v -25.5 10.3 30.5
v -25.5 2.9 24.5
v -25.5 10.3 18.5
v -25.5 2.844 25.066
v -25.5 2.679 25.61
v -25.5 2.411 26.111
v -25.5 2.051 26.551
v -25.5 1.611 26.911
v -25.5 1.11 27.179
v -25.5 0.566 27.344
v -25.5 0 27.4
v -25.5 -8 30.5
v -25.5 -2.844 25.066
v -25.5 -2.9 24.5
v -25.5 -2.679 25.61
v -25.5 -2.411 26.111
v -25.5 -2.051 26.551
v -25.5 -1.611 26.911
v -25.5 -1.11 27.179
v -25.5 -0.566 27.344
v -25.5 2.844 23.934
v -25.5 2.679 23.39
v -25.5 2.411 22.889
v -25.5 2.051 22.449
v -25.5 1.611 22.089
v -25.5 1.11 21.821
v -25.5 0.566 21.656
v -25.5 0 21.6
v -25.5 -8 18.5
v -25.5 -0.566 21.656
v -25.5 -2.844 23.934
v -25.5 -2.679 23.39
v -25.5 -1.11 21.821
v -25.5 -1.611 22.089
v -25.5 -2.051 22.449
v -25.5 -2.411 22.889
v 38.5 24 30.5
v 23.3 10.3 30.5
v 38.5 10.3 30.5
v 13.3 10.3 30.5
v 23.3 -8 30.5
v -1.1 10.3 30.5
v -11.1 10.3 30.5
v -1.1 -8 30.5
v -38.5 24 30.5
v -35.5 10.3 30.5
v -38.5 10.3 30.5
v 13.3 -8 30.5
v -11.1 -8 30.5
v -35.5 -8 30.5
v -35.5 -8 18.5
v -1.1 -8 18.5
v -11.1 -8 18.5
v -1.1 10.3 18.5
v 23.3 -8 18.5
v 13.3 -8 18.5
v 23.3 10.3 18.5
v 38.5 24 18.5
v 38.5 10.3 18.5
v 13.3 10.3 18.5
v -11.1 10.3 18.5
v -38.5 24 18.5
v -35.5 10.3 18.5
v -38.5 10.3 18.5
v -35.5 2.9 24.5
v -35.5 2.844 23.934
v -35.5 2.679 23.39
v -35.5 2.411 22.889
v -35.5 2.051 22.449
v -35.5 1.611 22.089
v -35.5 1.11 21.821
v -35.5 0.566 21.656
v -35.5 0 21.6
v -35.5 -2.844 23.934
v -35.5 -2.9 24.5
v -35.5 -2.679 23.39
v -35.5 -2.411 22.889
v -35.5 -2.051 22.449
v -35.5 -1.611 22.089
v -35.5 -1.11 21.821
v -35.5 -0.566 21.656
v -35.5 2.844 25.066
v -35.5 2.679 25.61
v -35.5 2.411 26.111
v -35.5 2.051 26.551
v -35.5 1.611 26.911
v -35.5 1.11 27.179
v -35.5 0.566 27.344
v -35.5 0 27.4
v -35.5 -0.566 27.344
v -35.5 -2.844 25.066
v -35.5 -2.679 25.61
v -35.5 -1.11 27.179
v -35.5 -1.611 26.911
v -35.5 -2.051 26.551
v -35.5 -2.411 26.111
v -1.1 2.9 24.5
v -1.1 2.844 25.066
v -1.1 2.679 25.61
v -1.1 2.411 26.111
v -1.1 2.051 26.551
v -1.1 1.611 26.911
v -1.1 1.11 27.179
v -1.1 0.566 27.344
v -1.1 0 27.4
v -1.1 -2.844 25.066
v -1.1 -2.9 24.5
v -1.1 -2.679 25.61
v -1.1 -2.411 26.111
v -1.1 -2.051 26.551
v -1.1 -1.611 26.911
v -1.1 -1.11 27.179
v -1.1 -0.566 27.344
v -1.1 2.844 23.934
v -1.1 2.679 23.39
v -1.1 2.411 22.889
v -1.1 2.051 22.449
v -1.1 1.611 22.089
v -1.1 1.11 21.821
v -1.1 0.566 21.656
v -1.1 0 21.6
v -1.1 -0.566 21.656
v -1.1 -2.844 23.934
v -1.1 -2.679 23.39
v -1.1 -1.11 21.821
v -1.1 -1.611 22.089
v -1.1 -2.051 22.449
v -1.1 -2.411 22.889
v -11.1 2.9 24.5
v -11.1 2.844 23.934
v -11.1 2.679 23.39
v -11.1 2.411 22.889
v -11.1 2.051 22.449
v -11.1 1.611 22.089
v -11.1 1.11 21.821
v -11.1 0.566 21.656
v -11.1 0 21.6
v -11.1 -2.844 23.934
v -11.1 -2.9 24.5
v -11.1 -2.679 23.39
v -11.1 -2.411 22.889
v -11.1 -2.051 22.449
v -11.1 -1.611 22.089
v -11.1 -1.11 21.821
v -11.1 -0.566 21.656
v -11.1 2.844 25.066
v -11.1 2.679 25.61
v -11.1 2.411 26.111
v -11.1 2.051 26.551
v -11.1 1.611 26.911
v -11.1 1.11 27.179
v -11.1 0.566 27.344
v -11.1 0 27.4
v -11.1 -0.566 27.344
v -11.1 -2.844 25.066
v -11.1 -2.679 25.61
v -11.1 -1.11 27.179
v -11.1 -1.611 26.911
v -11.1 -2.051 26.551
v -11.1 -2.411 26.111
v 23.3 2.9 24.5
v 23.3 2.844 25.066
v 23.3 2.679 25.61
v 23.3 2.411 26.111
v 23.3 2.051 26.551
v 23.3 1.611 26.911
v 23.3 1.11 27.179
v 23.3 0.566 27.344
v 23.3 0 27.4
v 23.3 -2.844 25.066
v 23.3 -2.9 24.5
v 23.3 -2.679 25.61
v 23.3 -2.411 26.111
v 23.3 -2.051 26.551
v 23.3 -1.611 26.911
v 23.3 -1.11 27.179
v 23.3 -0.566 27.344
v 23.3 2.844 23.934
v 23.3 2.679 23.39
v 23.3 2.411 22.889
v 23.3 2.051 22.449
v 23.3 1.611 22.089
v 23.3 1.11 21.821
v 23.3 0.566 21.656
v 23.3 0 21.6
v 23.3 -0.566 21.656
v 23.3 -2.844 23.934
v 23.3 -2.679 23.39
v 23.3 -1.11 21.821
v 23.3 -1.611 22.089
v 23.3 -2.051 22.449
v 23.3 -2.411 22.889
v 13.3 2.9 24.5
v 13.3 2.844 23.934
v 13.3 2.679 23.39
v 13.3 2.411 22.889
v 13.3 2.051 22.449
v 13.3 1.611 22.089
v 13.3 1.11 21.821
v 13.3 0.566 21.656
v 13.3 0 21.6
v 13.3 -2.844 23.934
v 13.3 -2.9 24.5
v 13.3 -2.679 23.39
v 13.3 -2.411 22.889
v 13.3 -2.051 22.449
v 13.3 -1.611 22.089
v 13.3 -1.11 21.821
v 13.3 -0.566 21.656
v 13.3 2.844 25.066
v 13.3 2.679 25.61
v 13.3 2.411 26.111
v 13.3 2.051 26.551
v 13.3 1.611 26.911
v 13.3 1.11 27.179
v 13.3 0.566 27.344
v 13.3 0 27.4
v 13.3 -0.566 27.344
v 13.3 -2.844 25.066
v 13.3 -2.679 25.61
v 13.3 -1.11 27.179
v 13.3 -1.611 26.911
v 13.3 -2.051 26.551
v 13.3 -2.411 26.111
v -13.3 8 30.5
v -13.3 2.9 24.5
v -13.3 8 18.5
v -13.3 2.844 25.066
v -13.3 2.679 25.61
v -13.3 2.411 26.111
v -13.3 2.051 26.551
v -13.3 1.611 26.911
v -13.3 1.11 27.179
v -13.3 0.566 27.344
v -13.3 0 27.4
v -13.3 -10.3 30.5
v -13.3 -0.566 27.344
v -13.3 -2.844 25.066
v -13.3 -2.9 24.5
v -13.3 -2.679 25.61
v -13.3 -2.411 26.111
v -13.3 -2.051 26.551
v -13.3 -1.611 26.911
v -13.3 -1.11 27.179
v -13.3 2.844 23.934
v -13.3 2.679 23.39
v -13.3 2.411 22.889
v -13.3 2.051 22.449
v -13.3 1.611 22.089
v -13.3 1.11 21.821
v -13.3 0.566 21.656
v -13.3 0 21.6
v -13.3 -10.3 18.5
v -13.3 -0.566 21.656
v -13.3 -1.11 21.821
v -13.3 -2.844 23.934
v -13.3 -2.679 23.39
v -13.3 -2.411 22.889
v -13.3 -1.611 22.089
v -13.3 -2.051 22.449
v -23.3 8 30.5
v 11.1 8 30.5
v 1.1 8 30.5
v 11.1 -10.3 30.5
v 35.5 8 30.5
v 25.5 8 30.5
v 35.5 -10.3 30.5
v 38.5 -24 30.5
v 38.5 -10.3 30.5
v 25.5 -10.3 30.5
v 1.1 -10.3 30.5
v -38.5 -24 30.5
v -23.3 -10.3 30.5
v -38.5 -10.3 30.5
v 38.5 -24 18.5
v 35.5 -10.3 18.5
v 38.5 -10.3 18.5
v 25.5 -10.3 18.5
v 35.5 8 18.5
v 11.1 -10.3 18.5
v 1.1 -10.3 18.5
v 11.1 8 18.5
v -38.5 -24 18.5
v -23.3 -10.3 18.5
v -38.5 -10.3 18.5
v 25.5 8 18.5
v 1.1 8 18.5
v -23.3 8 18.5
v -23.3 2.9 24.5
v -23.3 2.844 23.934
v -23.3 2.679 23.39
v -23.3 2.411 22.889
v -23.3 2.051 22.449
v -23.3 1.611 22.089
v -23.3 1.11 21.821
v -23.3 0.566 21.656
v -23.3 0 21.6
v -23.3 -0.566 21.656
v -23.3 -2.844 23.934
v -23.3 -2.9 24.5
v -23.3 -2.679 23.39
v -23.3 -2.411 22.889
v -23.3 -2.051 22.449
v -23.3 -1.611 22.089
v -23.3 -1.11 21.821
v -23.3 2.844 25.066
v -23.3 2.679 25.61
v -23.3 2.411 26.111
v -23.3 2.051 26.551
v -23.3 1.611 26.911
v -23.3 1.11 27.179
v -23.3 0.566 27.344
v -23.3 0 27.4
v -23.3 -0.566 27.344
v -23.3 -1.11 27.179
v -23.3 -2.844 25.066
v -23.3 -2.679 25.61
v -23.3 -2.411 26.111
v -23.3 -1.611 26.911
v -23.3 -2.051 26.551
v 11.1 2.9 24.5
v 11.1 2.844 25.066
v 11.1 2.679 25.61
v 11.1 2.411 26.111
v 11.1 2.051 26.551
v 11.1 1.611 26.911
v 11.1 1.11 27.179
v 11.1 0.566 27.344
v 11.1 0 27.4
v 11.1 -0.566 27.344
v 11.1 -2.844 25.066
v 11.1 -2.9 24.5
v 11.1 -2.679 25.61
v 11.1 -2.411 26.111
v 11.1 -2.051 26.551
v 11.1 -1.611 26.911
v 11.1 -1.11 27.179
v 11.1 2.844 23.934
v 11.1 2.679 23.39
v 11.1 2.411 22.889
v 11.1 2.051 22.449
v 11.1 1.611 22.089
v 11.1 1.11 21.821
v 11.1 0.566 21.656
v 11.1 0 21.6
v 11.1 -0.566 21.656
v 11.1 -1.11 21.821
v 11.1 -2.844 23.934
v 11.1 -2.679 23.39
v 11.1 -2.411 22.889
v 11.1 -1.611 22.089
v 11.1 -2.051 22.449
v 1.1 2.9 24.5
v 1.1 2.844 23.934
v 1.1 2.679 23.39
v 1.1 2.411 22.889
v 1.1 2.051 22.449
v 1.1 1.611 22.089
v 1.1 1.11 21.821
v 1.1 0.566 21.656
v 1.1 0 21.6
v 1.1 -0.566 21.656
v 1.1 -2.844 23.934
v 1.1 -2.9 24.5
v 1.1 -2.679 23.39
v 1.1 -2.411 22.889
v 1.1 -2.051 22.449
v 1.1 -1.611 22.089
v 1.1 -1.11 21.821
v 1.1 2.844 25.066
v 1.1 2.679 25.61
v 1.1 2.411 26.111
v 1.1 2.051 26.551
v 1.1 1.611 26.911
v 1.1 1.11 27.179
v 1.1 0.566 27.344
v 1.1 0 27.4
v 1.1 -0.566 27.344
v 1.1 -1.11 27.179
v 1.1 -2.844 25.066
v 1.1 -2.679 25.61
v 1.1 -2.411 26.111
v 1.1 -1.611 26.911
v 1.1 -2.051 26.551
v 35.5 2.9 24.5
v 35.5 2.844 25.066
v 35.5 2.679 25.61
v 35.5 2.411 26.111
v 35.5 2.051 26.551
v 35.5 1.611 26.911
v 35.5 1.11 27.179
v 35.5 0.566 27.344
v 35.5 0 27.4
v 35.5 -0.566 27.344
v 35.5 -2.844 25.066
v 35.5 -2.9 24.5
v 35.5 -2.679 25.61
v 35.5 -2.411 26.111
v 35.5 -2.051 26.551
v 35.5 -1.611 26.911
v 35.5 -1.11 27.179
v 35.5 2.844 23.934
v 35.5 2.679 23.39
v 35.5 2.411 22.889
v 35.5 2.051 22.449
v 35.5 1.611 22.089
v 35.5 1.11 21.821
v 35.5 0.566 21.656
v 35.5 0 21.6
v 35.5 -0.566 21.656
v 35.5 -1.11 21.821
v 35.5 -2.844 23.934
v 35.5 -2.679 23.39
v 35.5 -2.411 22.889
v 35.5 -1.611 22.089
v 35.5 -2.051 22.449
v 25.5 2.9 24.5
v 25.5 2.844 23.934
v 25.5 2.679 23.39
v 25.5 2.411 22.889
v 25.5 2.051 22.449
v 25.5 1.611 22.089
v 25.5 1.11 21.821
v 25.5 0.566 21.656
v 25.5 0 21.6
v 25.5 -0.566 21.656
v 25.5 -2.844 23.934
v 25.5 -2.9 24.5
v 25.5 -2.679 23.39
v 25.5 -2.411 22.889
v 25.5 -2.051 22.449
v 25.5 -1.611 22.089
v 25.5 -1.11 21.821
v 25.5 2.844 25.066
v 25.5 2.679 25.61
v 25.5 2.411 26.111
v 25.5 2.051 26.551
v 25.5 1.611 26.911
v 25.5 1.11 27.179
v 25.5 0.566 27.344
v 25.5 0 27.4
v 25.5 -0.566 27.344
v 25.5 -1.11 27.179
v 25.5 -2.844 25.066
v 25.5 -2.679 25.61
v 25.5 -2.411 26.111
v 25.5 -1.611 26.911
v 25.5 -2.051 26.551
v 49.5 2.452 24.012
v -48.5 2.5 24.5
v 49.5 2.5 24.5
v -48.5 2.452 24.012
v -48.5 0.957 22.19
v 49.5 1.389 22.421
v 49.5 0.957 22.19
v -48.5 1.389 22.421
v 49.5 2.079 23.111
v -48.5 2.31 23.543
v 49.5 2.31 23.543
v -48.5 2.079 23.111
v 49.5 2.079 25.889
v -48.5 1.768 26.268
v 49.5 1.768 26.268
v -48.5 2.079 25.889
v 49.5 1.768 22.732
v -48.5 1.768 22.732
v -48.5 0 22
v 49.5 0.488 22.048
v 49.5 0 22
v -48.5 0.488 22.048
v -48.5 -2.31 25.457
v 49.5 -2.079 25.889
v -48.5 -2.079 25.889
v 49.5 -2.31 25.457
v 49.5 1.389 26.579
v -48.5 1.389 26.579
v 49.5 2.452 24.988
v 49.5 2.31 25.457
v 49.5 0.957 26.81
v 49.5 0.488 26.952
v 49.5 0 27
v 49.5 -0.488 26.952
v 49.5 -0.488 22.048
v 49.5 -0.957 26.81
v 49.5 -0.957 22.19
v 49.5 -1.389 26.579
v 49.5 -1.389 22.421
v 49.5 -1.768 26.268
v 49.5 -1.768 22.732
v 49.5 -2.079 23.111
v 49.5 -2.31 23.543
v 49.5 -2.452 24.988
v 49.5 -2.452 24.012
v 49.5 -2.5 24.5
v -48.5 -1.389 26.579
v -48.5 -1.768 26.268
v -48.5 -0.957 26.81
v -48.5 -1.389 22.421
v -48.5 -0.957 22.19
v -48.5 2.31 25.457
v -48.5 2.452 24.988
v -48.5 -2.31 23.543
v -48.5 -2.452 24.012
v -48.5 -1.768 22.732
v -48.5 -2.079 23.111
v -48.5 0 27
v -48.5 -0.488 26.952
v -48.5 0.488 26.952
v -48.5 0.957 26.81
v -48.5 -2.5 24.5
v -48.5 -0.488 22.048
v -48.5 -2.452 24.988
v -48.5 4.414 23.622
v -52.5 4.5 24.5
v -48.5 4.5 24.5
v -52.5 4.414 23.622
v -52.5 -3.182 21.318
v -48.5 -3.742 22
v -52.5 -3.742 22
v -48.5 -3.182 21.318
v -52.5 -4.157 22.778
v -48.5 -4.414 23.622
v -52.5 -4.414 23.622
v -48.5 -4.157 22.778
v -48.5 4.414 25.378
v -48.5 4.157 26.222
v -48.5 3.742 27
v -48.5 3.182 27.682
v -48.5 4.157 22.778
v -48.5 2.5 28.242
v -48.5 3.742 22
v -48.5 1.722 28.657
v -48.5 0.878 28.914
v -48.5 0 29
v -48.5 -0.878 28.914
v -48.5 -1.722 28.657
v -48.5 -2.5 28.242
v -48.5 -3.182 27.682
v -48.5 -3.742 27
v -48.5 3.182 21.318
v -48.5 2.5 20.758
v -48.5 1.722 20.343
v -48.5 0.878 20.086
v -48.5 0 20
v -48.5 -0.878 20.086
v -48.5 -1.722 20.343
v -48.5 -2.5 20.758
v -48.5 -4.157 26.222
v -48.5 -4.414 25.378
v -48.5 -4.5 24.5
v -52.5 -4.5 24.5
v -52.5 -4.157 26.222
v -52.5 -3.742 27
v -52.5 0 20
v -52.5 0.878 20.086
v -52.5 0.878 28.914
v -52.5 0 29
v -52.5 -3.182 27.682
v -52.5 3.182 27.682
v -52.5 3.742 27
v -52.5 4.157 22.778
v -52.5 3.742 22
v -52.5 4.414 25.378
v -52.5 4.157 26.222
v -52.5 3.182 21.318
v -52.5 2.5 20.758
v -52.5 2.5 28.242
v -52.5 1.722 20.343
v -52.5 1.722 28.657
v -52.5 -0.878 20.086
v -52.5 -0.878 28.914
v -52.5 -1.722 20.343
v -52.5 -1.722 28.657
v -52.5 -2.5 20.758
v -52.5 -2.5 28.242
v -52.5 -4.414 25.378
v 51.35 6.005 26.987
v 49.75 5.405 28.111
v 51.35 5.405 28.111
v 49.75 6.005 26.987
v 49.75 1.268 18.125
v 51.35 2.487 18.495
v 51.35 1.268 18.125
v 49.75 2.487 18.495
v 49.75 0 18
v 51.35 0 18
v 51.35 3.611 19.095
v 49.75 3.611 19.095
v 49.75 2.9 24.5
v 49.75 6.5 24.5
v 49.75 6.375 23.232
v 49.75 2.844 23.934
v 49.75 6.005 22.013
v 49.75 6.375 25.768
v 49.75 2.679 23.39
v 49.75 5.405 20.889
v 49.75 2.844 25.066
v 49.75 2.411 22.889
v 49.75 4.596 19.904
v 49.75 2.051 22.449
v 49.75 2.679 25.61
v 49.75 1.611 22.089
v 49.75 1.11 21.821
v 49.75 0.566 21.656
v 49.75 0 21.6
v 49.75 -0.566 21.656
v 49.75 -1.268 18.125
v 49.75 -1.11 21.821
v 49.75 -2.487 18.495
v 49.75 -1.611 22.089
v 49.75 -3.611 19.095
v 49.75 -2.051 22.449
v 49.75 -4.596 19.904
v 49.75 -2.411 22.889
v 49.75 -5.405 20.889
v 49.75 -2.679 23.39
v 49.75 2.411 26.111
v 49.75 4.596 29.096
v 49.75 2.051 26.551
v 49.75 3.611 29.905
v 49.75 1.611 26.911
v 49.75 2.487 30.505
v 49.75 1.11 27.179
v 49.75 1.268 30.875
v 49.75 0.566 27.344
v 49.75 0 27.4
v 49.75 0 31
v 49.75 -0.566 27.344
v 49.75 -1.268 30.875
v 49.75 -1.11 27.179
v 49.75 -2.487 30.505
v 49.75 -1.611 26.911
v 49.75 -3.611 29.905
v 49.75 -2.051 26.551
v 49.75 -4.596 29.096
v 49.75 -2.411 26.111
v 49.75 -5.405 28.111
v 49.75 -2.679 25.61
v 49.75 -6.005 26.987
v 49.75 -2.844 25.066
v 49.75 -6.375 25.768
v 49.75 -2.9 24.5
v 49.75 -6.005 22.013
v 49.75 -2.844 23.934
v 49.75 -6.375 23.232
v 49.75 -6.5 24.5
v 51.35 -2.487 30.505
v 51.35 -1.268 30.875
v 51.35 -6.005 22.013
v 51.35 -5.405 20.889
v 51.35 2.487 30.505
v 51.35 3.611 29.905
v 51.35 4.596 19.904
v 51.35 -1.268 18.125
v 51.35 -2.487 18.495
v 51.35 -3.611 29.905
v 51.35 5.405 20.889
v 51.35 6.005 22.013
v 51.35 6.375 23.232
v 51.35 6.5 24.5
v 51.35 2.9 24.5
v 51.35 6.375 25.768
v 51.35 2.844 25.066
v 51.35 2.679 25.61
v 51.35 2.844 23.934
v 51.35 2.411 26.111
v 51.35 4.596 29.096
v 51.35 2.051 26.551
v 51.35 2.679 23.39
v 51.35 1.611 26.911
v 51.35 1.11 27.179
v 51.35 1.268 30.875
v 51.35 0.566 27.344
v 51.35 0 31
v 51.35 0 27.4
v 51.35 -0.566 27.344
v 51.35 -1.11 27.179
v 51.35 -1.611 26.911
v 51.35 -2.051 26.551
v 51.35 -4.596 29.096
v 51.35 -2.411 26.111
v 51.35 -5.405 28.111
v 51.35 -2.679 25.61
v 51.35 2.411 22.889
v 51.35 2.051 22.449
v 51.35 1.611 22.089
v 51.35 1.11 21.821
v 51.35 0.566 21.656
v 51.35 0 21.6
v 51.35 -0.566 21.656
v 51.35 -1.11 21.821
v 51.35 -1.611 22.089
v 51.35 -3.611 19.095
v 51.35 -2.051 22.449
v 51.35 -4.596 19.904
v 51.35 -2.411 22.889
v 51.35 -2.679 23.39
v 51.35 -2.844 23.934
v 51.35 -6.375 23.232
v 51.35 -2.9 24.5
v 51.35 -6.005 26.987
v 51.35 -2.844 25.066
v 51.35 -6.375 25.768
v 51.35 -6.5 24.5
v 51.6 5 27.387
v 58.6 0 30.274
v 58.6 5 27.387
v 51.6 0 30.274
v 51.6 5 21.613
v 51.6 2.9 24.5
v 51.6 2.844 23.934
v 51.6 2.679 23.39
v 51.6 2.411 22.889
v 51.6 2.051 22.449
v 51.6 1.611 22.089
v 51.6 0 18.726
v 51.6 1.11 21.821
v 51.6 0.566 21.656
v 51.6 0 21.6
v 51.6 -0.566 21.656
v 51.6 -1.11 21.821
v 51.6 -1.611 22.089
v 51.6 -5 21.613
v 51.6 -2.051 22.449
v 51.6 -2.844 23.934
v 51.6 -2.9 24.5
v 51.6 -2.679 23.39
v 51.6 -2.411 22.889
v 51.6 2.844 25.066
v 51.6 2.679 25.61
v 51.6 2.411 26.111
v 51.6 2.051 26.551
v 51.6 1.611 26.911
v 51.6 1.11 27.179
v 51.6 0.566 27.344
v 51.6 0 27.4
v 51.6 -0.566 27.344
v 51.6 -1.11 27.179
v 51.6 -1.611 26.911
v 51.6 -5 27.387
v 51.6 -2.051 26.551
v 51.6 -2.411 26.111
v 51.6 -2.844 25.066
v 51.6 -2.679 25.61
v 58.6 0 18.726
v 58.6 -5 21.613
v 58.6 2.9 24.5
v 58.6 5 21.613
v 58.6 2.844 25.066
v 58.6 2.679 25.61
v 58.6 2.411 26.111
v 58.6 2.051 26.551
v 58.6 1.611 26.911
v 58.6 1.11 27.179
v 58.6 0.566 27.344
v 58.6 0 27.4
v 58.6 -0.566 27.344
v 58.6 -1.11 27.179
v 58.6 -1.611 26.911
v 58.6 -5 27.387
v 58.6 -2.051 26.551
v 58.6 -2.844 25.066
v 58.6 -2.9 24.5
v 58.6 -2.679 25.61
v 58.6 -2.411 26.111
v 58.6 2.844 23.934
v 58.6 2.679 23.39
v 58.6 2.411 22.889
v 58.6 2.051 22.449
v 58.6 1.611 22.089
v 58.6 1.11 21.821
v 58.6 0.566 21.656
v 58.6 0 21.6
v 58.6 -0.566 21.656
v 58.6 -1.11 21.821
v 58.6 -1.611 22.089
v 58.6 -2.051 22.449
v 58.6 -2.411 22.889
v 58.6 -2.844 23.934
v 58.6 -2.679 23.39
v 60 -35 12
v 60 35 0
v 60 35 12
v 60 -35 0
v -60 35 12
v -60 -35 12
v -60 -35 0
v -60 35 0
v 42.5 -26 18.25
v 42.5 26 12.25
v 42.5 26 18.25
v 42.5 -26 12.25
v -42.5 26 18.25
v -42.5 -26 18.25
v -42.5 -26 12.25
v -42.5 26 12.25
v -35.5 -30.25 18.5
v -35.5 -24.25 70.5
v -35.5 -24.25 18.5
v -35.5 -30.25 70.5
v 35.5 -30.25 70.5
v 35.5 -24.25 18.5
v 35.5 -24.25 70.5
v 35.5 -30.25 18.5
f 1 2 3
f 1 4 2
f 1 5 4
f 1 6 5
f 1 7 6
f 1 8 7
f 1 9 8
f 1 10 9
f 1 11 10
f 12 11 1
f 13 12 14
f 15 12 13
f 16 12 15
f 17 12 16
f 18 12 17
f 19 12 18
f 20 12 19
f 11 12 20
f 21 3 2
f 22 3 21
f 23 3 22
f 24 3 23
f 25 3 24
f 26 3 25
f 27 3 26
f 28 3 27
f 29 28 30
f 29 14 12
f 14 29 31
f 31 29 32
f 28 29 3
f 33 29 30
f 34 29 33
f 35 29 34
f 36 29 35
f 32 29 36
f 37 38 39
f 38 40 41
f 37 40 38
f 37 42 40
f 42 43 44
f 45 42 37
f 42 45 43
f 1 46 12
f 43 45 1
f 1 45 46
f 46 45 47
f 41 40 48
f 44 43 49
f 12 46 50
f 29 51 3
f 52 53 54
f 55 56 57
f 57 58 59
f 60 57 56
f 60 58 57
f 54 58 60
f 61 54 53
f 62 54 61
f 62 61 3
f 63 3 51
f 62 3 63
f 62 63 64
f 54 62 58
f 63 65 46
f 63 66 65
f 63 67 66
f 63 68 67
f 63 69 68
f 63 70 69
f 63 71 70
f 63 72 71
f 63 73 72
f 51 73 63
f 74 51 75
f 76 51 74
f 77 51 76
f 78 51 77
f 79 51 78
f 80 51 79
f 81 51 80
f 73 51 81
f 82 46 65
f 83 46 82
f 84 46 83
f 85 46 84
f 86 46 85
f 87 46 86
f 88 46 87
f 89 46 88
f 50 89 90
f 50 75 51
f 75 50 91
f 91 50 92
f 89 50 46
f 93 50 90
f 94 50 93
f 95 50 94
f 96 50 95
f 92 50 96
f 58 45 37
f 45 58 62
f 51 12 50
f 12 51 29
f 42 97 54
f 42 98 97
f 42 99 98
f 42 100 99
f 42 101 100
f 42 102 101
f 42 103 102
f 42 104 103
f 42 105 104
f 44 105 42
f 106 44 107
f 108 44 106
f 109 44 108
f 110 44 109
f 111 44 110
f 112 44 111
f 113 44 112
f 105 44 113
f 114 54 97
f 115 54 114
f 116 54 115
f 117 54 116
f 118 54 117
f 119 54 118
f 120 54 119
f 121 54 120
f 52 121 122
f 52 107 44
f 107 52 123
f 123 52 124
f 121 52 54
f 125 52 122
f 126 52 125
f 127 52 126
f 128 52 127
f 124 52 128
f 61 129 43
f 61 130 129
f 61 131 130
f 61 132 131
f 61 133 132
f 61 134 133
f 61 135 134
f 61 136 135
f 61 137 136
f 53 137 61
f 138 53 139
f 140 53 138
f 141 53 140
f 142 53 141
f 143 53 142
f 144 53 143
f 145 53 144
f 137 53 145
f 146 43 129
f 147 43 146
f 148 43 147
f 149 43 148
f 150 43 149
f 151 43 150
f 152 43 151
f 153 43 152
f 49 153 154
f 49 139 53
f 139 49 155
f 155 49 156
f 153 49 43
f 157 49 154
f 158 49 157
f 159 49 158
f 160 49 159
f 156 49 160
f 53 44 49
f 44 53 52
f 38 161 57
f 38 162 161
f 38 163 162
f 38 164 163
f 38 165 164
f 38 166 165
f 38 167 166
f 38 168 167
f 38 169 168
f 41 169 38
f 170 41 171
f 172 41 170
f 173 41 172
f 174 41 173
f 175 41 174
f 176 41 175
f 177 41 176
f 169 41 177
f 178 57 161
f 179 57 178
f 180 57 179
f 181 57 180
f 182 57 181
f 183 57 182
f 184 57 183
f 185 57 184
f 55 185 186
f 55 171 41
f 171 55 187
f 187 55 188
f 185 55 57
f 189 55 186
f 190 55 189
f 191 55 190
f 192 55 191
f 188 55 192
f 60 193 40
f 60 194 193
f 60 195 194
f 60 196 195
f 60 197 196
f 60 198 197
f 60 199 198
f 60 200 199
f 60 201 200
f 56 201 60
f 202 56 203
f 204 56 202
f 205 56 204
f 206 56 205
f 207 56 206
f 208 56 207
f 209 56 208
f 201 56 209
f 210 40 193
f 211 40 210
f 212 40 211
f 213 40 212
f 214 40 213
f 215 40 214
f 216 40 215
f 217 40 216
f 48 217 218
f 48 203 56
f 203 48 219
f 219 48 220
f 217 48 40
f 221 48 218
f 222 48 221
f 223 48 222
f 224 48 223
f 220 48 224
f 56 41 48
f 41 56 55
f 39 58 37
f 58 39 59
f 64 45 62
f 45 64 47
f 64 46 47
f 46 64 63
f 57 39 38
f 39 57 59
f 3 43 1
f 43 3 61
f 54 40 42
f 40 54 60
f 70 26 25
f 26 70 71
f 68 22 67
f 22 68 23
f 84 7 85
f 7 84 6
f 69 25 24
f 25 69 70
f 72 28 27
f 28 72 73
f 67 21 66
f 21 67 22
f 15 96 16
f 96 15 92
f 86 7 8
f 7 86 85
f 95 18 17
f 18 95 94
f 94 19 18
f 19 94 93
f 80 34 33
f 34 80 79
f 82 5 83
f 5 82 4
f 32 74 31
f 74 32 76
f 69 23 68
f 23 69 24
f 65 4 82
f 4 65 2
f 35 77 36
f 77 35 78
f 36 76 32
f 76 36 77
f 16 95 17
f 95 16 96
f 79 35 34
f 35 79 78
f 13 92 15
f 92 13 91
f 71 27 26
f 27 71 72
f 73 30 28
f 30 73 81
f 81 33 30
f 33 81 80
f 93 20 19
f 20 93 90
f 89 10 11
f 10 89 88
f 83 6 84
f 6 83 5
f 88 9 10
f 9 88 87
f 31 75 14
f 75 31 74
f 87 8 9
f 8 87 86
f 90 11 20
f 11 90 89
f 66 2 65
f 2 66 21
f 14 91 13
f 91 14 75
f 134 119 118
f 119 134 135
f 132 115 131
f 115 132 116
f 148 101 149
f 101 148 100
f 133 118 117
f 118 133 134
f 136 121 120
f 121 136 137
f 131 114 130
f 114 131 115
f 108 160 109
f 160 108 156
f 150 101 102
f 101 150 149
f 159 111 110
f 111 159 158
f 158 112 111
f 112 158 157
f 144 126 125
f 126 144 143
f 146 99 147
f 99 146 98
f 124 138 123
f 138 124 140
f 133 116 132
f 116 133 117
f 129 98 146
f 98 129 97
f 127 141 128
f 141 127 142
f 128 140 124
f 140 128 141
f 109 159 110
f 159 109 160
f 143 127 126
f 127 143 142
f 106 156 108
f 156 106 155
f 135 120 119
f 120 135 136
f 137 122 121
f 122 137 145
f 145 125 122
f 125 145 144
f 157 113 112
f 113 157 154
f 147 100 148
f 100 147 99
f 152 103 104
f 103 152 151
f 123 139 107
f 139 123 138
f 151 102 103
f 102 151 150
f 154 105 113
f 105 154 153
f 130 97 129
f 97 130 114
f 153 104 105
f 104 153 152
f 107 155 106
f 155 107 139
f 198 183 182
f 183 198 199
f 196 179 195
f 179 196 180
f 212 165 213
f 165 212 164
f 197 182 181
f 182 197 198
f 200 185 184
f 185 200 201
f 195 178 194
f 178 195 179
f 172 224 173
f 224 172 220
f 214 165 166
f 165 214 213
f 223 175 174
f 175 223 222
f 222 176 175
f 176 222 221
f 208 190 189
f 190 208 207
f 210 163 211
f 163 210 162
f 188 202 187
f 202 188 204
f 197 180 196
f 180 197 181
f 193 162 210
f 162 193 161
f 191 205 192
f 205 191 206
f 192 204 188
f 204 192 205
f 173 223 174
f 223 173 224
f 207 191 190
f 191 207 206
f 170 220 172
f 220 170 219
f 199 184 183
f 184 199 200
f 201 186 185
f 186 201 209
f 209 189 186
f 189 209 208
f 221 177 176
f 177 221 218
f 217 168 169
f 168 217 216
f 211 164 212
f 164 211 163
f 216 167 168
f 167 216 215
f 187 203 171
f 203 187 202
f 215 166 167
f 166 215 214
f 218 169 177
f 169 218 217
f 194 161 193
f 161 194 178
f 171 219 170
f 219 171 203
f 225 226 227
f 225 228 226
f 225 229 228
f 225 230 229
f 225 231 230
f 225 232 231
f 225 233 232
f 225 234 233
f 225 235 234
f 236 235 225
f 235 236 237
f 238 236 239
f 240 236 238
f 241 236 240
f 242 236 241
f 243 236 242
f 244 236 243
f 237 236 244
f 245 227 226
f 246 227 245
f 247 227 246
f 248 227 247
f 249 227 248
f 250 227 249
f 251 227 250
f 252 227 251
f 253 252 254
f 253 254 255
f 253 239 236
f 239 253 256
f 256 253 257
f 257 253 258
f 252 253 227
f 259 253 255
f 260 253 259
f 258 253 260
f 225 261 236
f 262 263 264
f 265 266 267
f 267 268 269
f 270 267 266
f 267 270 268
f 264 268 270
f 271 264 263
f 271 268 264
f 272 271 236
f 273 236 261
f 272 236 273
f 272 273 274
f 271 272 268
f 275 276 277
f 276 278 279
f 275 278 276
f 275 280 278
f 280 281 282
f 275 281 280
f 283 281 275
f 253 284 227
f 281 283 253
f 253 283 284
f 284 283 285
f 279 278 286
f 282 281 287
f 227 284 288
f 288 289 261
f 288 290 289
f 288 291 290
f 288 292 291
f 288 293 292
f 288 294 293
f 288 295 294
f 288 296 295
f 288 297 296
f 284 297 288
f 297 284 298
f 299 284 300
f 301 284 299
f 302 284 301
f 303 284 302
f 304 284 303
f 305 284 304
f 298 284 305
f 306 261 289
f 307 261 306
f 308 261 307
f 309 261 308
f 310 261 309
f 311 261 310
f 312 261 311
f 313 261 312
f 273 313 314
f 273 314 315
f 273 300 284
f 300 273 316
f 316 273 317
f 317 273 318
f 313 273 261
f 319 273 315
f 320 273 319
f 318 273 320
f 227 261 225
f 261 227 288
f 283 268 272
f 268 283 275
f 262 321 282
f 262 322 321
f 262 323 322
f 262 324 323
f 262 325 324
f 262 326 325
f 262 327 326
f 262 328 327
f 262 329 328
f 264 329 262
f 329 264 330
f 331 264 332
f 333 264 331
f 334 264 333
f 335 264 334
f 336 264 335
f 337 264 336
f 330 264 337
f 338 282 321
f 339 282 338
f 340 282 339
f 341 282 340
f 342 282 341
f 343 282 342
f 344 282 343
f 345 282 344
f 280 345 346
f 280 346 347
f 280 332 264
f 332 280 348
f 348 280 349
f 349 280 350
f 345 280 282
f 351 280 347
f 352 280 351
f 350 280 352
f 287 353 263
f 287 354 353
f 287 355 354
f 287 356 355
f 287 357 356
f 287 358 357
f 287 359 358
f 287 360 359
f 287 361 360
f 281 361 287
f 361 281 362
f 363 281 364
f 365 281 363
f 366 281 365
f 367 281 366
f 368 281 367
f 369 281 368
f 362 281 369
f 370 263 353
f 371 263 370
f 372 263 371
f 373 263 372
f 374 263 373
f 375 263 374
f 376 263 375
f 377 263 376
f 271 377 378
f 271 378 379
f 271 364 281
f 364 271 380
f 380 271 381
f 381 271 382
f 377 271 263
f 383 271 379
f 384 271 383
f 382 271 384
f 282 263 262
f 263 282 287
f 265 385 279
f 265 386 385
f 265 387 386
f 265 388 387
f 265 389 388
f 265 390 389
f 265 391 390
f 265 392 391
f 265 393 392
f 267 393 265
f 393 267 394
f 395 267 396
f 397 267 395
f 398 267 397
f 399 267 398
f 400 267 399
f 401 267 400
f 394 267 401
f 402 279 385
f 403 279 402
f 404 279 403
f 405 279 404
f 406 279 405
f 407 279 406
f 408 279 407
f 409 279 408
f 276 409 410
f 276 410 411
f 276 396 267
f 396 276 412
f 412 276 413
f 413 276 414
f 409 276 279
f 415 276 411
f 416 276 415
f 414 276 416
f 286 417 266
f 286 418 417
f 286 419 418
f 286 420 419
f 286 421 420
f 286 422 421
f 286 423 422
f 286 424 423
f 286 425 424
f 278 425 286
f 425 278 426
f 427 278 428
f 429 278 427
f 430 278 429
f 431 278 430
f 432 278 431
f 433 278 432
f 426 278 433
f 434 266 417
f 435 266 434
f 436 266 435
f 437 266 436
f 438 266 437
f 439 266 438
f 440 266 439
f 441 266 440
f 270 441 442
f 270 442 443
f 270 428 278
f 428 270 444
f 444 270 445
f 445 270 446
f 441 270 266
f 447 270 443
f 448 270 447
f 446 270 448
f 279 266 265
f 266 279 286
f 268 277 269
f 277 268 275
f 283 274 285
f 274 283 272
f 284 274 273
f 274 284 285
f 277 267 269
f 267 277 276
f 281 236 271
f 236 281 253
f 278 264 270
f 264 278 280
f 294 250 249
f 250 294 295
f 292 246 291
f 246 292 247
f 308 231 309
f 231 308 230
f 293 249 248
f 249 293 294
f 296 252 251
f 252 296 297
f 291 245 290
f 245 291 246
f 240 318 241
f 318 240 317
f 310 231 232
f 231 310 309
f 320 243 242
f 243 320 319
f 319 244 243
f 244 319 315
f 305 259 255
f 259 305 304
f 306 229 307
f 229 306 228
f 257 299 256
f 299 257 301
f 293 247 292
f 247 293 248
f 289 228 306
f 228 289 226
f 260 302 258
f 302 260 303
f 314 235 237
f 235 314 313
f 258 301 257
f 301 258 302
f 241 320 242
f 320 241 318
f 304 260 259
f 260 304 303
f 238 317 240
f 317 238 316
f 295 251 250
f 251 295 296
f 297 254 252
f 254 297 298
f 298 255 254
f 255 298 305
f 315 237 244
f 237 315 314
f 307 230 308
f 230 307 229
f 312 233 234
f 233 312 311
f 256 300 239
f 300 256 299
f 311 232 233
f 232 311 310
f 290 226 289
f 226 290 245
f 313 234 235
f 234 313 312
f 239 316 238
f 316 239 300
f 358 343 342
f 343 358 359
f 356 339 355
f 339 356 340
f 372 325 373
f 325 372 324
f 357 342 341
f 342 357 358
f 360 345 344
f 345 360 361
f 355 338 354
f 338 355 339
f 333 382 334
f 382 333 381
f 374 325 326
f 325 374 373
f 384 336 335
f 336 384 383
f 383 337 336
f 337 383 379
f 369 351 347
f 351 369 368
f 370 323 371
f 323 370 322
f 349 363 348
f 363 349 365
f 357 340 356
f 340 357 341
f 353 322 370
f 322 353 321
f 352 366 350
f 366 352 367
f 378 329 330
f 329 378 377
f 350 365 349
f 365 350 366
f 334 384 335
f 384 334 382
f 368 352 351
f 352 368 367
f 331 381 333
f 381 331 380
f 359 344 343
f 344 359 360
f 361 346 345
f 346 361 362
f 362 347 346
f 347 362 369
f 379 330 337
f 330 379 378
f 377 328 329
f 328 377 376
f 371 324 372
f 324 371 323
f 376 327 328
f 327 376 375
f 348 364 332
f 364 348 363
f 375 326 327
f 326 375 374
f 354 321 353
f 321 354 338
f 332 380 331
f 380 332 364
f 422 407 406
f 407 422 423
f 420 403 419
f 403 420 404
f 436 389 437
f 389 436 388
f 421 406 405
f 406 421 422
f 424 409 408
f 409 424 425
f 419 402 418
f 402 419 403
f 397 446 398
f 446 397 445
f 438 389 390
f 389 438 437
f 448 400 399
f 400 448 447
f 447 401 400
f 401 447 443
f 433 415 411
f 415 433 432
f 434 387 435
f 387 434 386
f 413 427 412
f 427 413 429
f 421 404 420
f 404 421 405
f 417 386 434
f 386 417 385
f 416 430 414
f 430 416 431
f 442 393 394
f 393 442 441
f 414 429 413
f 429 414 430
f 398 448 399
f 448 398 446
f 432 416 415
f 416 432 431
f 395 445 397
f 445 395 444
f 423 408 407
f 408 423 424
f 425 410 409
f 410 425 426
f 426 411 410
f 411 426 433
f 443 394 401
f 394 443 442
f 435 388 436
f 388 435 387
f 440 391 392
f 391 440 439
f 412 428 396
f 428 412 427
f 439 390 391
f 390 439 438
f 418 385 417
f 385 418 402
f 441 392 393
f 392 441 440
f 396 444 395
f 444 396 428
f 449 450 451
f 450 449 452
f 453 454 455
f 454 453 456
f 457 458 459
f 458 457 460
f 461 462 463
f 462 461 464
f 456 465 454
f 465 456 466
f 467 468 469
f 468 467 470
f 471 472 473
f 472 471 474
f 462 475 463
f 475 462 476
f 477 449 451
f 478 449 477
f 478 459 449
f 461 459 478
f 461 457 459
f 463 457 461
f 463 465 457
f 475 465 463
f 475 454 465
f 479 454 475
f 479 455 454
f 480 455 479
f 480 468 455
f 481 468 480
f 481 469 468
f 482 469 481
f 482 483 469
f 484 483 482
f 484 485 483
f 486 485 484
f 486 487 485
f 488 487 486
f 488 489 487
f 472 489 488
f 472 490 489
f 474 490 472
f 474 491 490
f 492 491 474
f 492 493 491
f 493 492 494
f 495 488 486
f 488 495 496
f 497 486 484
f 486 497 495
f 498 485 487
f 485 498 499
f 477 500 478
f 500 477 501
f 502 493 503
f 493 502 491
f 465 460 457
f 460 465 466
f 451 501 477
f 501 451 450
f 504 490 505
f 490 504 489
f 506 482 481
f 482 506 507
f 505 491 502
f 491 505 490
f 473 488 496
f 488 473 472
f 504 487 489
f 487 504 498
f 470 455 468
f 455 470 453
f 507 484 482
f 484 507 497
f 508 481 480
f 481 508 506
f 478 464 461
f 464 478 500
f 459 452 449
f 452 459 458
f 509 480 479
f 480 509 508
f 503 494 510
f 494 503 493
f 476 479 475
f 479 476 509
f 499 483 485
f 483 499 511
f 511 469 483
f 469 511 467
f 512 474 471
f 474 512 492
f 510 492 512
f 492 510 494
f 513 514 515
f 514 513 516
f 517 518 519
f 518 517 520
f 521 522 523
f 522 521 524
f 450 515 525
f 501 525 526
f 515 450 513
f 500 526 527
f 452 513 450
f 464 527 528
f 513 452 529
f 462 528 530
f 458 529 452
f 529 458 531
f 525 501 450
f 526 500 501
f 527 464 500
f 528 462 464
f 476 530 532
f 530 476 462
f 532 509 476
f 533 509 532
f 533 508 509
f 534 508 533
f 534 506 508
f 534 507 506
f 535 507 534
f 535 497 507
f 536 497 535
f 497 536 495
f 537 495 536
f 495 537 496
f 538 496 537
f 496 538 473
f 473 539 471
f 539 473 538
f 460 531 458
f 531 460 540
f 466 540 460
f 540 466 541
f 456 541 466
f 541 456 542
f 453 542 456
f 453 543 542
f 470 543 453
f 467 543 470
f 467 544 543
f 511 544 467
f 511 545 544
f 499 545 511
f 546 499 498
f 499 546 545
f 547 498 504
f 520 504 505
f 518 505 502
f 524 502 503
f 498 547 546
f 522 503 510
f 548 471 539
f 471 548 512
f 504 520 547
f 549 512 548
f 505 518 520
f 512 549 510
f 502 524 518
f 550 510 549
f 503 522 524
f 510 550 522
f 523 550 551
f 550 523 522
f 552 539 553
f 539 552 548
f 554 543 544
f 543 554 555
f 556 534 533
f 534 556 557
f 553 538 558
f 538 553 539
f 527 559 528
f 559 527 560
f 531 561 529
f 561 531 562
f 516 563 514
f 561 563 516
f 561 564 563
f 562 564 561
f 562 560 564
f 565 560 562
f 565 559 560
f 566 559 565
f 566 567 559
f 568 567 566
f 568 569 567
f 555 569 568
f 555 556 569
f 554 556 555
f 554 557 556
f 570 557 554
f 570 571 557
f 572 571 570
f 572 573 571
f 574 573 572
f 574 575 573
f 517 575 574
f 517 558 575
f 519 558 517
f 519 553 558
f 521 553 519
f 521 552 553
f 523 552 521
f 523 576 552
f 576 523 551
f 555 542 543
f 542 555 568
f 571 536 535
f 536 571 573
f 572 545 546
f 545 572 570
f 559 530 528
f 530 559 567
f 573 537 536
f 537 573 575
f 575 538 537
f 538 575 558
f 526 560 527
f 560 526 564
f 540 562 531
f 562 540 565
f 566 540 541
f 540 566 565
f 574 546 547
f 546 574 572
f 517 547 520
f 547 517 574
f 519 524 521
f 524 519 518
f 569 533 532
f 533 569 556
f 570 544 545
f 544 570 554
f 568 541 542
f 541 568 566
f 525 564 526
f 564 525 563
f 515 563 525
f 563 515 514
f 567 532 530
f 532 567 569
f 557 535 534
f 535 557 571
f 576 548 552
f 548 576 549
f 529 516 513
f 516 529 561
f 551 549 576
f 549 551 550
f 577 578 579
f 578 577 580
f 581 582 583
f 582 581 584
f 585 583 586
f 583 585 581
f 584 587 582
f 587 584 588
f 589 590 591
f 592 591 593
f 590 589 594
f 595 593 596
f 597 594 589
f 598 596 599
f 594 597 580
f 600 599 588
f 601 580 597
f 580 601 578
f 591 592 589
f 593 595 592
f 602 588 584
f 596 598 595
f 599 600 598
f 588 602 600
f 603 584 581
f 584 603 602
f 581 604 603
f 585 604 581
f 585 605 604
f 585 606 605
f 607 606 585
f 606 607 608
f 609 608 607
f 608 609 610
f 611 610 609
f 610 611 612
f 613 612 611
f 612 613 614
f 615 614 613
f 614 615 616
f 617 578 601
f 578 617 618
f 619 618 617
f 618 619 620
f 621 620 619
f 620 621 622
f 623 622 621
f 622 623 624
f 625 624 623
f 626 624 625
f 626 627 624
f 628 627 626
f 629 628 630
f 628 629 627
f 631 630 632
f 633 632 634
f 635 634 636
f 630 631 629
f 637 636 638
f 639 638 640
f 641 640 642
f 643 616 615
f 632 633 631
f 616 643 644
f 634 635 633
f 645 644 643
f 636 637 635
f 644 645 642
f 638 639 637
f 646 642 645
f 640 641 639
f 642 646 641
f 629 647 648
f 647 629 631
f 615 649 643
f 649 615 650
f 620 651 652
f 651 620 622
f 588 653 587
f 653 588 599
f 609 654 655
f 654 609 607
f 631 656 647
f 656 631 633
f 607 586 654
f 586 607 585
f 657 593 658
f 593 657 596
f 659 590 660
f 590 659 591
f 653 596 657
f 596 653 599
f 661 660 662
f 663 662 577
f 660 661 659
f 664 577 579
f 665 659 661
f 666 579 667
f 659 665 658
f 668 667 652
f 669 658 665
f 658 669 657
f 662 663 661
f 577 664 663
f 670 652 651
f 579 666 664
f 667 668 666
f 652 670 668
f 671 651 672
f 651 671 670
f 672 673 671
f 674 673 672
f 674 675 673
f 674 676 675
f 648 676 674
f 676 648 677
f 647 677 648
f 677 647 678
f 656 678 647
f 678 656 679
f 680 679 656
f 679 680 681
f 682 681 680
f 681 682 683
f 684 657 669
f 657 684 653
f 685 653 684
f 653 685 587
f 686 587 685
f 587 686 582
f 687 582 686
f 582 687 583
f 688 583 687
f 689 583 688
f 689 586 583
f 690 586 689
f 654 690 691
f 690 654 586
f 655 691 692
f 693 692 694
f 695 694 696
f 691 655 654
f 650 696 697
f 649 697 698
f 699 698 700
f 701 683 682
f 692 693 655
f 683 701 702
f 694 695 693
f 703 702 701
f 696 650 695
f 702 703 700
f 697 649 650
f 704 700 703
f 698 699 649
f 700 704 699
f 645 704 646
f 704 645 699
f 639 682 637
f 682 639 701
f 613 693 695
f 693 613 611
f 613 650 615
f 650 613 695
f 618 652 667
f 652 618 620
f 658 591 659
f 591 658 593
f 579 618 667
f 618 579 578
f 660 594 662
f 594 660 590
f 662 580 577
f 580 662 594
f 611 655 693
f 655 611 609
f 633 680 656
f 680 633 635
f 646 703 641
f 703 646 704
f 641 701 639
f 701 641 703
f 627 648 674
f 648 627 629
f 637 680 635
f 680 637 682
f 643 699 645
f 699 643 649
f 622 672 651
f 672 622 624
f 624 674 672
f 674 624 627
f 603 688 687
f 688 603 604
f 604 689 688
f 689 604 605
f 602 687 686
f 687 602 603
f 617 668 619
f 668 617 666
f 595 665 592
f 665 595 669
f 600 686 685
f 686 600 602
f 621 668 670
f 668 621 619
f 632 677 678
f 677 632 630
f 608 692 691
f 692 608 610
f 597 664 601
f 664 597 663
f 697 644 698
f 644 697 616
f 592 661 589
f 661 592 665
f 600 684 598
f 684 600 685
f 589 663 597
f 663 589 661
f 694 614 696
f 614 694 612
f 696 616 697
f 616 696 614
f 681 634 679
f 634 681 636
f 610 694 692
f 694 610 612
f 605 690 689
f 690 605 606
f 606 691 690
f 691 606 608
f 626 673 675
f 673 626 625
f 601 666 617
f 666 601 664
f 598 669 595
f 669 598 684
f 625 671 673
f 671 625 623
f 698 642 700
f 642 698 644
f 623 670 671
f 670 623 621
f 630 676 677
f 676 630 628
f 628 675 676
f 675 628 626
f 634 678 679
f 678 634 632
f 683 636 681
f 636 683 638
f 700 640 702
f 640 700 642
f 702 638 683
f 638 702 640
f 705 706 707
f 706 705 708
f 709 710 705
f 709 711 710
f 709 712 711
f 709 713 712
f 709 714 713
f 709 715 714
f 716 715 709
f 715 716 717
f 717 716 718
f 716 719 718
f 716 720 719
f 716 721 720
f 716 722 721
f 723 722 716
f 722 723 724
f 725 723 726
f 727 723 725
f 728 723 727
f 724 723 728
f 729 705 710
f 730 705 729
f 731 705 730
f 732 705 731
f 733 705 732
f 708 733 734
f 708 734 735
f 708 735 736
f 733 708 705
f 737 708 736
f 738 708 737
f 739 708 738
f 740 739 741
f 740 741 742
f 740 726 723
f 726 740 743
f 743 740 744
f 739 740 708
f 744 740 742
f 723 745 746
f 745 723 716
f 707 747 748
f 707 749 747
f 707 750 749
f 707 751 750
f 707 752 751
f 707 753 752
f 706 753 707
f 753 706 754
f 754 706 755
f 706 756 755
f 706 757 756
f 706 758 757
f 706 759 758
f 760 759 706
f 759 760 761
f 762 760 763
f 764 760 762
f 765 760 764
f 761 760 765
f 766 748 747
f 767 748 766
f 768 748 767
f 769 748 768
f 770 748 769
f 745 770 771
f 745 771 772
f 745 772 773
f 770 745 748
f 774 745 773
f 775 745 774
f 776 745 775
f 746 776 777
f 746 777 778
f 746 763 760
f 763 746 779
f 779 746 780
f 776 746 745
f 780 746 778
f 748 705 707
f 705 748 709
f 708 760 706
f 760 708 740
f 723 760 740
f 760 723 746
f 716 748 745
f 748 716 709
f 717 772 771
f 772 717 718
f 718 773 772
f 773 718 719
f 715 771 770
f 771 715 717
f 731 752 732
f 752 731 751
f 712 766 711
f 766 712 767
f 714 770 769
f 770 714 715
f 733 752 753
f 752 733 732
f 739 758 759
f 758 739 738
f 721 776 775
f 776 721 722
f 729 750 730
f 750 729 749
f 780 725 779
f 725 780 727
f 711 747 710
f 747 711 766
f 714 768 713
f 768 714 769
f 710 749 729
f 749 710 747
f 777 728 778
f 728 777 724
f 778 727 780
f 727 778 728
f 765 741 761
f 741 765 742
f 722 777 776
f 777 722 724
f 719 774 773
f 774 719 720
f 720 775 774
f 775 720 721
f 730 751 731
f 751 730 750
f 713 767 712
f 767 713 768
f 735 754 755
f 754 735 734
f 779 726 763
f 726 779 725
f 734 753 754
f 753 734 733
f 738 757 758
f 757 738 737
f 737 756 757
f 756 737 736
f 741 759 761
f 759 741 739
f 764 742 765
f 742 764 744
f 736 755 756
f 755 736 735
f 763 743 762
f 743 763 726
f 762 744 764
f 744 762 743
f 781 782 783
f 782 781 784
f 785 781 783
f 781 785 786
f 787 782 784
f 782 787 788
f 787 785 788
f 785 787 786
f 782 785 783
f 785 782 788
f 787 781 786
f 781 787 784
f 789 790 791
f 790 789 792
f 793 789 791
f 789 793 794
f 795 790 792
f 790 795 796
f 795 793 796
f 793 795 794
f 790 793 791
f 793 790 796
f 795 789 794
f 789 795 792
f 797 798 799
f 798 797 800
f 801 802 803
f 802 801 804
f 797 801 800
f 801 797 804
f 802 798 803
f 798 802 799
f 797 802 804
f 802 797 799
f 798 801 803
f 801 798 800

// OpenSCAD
$fn = 32;

// ------------------------------------------------------------------------
// Comb hinge with flap: leaf 77 x 24 mm, pin d5, flap 52 mm
// Every part is its own module, assembly() places every instance.
// ------------------------------------------------------------------------

// --- part 1 ---
module hinge_bed() {
  difference() {
    translate([-60, -35, 0]) cube([120, 70, 12]);
  }
}

// --- part 2 ---
module hinge_riser() {
  difference() {
    translate([-42.5, -26, 0]) cube([85, 52, 6]);
  }
}

// --- part 3 ---
module hinge_leaf_a() {
  difference() {
    union() {
      translate([-35.5, -8, -6]) cube([10, 32, 12]);
      translate([-11.1, -8, -6]) cube([10, 32, 12]);
      translate([13.3, -8, -6]) cube([10, 32, 12]);
      translate([-38.5, 10.3, -6]) cube([77, 13.7, 12]);
    }
    translate([-30.5, 0, 0]) rotate([0, 90, 0]) cylinder(h = 12, d = 5.8, center = true);
    translate([-6.1, 0, 0]) rotate([0, 90, 0]) cylinder(h = 12, d = 5.8, center = true);
    translate([18.3, 0, 0]) rotate([0, 90, 0]) cylinder(h = 12, d = 5.8, center = true);
  }
}

// --- part 4 ---
module hinge_leaf_b() {
  difference() {
    union() {
      translate([-23.3, -24, -6]) cube([10, 32, 12]);
      translate([1.1, -24, -6]) cube([10, 32, 12]);
      translate([25.5, -24, -6]) cube([10, 32, 12]);
      translate([-38.5, -24, -6]) cube([77, 13.7, 12]);
    }
    translate([-18.3, 0, 0]) rotate([0, 90, 0]) cylinder(h = 12, d = 5.8, center = true);
    translate([6.1, 0, 0]) rotate([0, 90, 0]) cylinder(h = 12, d = 5.8, center = true);
    translate([30.5, 0, 0]) rotate([0, 90, 0]) cylinder(h = 12, d = 5.8, center = true);
  }
}

// --- part 5 ---
module hinge_flap() {
  difference() {
    translate([-35.5, -26, 0]) cube([71, 52, 6]);
  }
}

// --- part 6 ---
module hinge_pin() {
  rotate([0, 90, 0]) cylinder(h = 99, d = 5, center = true);
  translate([-52.5, 0, 0]) rotate([0, 90, 0]) cylinder(h = 4, d = 9);
}

// --- part 7 ---
module pin_washer() {
  difference() {
      translate([0, 0, 0]) cylinder(h = 1.6, d = 13);
      translate([0, 0, -1]) cylinder(h = 3.6, d = 5.8);
    }
}

// --- part 8 ---
module pin_nut() {
  difference() {
    linear_extrude(height = 7) polygon(points = [[5.774, 0], [2.887, 5], [-2.887, 5], [-5.774, 0], [-2.887, -5], [2.887, -5]]);
    translate([0, 0, -1]) cylinder(h = 9, d = 5.8);
  }
}

// --- assembly ---
module assembly() {
  color([0.80, 0.24, 0.20]) translate([0, 0, 0]) rotate([0, 0, 0]) hinge_bed();
  color([0.20, 0.45, 0.75]) translate([0, 0, 12.25]) rotate([0, 0, 0]) hinge_riser();
  color([0.25, 0.62, 0.32]) translate([0, 0, 24.5]) rotate([0, 0, 0]) hinge_leaf_a();
  color([0.92, 0.70, 0.18]) translate([0, 0, 24.5]) rotate([0, 0, 0]) hinge_leaf_b();
  color([0.58, 0.35, 0.70]) translate([0, -24.25, 44.5]) rotate([90, 0, 0]) hinge_flap();
  color([0.16, 0.66, 0.66]) translate([0, 0, 24.5]) rotate([0, 0, 0]) hinge_pin();
  color([0.85, 0.48, 0.18]) translate([49.75, 0, 24.5]) rotate([0, 90, 0]) pin_washer();
  color([0.55, 0.60, 0.65]) translate([51.6, 0, 24.5]) rotate([0, 90, 0]) pin_nut();
}

assembly();
